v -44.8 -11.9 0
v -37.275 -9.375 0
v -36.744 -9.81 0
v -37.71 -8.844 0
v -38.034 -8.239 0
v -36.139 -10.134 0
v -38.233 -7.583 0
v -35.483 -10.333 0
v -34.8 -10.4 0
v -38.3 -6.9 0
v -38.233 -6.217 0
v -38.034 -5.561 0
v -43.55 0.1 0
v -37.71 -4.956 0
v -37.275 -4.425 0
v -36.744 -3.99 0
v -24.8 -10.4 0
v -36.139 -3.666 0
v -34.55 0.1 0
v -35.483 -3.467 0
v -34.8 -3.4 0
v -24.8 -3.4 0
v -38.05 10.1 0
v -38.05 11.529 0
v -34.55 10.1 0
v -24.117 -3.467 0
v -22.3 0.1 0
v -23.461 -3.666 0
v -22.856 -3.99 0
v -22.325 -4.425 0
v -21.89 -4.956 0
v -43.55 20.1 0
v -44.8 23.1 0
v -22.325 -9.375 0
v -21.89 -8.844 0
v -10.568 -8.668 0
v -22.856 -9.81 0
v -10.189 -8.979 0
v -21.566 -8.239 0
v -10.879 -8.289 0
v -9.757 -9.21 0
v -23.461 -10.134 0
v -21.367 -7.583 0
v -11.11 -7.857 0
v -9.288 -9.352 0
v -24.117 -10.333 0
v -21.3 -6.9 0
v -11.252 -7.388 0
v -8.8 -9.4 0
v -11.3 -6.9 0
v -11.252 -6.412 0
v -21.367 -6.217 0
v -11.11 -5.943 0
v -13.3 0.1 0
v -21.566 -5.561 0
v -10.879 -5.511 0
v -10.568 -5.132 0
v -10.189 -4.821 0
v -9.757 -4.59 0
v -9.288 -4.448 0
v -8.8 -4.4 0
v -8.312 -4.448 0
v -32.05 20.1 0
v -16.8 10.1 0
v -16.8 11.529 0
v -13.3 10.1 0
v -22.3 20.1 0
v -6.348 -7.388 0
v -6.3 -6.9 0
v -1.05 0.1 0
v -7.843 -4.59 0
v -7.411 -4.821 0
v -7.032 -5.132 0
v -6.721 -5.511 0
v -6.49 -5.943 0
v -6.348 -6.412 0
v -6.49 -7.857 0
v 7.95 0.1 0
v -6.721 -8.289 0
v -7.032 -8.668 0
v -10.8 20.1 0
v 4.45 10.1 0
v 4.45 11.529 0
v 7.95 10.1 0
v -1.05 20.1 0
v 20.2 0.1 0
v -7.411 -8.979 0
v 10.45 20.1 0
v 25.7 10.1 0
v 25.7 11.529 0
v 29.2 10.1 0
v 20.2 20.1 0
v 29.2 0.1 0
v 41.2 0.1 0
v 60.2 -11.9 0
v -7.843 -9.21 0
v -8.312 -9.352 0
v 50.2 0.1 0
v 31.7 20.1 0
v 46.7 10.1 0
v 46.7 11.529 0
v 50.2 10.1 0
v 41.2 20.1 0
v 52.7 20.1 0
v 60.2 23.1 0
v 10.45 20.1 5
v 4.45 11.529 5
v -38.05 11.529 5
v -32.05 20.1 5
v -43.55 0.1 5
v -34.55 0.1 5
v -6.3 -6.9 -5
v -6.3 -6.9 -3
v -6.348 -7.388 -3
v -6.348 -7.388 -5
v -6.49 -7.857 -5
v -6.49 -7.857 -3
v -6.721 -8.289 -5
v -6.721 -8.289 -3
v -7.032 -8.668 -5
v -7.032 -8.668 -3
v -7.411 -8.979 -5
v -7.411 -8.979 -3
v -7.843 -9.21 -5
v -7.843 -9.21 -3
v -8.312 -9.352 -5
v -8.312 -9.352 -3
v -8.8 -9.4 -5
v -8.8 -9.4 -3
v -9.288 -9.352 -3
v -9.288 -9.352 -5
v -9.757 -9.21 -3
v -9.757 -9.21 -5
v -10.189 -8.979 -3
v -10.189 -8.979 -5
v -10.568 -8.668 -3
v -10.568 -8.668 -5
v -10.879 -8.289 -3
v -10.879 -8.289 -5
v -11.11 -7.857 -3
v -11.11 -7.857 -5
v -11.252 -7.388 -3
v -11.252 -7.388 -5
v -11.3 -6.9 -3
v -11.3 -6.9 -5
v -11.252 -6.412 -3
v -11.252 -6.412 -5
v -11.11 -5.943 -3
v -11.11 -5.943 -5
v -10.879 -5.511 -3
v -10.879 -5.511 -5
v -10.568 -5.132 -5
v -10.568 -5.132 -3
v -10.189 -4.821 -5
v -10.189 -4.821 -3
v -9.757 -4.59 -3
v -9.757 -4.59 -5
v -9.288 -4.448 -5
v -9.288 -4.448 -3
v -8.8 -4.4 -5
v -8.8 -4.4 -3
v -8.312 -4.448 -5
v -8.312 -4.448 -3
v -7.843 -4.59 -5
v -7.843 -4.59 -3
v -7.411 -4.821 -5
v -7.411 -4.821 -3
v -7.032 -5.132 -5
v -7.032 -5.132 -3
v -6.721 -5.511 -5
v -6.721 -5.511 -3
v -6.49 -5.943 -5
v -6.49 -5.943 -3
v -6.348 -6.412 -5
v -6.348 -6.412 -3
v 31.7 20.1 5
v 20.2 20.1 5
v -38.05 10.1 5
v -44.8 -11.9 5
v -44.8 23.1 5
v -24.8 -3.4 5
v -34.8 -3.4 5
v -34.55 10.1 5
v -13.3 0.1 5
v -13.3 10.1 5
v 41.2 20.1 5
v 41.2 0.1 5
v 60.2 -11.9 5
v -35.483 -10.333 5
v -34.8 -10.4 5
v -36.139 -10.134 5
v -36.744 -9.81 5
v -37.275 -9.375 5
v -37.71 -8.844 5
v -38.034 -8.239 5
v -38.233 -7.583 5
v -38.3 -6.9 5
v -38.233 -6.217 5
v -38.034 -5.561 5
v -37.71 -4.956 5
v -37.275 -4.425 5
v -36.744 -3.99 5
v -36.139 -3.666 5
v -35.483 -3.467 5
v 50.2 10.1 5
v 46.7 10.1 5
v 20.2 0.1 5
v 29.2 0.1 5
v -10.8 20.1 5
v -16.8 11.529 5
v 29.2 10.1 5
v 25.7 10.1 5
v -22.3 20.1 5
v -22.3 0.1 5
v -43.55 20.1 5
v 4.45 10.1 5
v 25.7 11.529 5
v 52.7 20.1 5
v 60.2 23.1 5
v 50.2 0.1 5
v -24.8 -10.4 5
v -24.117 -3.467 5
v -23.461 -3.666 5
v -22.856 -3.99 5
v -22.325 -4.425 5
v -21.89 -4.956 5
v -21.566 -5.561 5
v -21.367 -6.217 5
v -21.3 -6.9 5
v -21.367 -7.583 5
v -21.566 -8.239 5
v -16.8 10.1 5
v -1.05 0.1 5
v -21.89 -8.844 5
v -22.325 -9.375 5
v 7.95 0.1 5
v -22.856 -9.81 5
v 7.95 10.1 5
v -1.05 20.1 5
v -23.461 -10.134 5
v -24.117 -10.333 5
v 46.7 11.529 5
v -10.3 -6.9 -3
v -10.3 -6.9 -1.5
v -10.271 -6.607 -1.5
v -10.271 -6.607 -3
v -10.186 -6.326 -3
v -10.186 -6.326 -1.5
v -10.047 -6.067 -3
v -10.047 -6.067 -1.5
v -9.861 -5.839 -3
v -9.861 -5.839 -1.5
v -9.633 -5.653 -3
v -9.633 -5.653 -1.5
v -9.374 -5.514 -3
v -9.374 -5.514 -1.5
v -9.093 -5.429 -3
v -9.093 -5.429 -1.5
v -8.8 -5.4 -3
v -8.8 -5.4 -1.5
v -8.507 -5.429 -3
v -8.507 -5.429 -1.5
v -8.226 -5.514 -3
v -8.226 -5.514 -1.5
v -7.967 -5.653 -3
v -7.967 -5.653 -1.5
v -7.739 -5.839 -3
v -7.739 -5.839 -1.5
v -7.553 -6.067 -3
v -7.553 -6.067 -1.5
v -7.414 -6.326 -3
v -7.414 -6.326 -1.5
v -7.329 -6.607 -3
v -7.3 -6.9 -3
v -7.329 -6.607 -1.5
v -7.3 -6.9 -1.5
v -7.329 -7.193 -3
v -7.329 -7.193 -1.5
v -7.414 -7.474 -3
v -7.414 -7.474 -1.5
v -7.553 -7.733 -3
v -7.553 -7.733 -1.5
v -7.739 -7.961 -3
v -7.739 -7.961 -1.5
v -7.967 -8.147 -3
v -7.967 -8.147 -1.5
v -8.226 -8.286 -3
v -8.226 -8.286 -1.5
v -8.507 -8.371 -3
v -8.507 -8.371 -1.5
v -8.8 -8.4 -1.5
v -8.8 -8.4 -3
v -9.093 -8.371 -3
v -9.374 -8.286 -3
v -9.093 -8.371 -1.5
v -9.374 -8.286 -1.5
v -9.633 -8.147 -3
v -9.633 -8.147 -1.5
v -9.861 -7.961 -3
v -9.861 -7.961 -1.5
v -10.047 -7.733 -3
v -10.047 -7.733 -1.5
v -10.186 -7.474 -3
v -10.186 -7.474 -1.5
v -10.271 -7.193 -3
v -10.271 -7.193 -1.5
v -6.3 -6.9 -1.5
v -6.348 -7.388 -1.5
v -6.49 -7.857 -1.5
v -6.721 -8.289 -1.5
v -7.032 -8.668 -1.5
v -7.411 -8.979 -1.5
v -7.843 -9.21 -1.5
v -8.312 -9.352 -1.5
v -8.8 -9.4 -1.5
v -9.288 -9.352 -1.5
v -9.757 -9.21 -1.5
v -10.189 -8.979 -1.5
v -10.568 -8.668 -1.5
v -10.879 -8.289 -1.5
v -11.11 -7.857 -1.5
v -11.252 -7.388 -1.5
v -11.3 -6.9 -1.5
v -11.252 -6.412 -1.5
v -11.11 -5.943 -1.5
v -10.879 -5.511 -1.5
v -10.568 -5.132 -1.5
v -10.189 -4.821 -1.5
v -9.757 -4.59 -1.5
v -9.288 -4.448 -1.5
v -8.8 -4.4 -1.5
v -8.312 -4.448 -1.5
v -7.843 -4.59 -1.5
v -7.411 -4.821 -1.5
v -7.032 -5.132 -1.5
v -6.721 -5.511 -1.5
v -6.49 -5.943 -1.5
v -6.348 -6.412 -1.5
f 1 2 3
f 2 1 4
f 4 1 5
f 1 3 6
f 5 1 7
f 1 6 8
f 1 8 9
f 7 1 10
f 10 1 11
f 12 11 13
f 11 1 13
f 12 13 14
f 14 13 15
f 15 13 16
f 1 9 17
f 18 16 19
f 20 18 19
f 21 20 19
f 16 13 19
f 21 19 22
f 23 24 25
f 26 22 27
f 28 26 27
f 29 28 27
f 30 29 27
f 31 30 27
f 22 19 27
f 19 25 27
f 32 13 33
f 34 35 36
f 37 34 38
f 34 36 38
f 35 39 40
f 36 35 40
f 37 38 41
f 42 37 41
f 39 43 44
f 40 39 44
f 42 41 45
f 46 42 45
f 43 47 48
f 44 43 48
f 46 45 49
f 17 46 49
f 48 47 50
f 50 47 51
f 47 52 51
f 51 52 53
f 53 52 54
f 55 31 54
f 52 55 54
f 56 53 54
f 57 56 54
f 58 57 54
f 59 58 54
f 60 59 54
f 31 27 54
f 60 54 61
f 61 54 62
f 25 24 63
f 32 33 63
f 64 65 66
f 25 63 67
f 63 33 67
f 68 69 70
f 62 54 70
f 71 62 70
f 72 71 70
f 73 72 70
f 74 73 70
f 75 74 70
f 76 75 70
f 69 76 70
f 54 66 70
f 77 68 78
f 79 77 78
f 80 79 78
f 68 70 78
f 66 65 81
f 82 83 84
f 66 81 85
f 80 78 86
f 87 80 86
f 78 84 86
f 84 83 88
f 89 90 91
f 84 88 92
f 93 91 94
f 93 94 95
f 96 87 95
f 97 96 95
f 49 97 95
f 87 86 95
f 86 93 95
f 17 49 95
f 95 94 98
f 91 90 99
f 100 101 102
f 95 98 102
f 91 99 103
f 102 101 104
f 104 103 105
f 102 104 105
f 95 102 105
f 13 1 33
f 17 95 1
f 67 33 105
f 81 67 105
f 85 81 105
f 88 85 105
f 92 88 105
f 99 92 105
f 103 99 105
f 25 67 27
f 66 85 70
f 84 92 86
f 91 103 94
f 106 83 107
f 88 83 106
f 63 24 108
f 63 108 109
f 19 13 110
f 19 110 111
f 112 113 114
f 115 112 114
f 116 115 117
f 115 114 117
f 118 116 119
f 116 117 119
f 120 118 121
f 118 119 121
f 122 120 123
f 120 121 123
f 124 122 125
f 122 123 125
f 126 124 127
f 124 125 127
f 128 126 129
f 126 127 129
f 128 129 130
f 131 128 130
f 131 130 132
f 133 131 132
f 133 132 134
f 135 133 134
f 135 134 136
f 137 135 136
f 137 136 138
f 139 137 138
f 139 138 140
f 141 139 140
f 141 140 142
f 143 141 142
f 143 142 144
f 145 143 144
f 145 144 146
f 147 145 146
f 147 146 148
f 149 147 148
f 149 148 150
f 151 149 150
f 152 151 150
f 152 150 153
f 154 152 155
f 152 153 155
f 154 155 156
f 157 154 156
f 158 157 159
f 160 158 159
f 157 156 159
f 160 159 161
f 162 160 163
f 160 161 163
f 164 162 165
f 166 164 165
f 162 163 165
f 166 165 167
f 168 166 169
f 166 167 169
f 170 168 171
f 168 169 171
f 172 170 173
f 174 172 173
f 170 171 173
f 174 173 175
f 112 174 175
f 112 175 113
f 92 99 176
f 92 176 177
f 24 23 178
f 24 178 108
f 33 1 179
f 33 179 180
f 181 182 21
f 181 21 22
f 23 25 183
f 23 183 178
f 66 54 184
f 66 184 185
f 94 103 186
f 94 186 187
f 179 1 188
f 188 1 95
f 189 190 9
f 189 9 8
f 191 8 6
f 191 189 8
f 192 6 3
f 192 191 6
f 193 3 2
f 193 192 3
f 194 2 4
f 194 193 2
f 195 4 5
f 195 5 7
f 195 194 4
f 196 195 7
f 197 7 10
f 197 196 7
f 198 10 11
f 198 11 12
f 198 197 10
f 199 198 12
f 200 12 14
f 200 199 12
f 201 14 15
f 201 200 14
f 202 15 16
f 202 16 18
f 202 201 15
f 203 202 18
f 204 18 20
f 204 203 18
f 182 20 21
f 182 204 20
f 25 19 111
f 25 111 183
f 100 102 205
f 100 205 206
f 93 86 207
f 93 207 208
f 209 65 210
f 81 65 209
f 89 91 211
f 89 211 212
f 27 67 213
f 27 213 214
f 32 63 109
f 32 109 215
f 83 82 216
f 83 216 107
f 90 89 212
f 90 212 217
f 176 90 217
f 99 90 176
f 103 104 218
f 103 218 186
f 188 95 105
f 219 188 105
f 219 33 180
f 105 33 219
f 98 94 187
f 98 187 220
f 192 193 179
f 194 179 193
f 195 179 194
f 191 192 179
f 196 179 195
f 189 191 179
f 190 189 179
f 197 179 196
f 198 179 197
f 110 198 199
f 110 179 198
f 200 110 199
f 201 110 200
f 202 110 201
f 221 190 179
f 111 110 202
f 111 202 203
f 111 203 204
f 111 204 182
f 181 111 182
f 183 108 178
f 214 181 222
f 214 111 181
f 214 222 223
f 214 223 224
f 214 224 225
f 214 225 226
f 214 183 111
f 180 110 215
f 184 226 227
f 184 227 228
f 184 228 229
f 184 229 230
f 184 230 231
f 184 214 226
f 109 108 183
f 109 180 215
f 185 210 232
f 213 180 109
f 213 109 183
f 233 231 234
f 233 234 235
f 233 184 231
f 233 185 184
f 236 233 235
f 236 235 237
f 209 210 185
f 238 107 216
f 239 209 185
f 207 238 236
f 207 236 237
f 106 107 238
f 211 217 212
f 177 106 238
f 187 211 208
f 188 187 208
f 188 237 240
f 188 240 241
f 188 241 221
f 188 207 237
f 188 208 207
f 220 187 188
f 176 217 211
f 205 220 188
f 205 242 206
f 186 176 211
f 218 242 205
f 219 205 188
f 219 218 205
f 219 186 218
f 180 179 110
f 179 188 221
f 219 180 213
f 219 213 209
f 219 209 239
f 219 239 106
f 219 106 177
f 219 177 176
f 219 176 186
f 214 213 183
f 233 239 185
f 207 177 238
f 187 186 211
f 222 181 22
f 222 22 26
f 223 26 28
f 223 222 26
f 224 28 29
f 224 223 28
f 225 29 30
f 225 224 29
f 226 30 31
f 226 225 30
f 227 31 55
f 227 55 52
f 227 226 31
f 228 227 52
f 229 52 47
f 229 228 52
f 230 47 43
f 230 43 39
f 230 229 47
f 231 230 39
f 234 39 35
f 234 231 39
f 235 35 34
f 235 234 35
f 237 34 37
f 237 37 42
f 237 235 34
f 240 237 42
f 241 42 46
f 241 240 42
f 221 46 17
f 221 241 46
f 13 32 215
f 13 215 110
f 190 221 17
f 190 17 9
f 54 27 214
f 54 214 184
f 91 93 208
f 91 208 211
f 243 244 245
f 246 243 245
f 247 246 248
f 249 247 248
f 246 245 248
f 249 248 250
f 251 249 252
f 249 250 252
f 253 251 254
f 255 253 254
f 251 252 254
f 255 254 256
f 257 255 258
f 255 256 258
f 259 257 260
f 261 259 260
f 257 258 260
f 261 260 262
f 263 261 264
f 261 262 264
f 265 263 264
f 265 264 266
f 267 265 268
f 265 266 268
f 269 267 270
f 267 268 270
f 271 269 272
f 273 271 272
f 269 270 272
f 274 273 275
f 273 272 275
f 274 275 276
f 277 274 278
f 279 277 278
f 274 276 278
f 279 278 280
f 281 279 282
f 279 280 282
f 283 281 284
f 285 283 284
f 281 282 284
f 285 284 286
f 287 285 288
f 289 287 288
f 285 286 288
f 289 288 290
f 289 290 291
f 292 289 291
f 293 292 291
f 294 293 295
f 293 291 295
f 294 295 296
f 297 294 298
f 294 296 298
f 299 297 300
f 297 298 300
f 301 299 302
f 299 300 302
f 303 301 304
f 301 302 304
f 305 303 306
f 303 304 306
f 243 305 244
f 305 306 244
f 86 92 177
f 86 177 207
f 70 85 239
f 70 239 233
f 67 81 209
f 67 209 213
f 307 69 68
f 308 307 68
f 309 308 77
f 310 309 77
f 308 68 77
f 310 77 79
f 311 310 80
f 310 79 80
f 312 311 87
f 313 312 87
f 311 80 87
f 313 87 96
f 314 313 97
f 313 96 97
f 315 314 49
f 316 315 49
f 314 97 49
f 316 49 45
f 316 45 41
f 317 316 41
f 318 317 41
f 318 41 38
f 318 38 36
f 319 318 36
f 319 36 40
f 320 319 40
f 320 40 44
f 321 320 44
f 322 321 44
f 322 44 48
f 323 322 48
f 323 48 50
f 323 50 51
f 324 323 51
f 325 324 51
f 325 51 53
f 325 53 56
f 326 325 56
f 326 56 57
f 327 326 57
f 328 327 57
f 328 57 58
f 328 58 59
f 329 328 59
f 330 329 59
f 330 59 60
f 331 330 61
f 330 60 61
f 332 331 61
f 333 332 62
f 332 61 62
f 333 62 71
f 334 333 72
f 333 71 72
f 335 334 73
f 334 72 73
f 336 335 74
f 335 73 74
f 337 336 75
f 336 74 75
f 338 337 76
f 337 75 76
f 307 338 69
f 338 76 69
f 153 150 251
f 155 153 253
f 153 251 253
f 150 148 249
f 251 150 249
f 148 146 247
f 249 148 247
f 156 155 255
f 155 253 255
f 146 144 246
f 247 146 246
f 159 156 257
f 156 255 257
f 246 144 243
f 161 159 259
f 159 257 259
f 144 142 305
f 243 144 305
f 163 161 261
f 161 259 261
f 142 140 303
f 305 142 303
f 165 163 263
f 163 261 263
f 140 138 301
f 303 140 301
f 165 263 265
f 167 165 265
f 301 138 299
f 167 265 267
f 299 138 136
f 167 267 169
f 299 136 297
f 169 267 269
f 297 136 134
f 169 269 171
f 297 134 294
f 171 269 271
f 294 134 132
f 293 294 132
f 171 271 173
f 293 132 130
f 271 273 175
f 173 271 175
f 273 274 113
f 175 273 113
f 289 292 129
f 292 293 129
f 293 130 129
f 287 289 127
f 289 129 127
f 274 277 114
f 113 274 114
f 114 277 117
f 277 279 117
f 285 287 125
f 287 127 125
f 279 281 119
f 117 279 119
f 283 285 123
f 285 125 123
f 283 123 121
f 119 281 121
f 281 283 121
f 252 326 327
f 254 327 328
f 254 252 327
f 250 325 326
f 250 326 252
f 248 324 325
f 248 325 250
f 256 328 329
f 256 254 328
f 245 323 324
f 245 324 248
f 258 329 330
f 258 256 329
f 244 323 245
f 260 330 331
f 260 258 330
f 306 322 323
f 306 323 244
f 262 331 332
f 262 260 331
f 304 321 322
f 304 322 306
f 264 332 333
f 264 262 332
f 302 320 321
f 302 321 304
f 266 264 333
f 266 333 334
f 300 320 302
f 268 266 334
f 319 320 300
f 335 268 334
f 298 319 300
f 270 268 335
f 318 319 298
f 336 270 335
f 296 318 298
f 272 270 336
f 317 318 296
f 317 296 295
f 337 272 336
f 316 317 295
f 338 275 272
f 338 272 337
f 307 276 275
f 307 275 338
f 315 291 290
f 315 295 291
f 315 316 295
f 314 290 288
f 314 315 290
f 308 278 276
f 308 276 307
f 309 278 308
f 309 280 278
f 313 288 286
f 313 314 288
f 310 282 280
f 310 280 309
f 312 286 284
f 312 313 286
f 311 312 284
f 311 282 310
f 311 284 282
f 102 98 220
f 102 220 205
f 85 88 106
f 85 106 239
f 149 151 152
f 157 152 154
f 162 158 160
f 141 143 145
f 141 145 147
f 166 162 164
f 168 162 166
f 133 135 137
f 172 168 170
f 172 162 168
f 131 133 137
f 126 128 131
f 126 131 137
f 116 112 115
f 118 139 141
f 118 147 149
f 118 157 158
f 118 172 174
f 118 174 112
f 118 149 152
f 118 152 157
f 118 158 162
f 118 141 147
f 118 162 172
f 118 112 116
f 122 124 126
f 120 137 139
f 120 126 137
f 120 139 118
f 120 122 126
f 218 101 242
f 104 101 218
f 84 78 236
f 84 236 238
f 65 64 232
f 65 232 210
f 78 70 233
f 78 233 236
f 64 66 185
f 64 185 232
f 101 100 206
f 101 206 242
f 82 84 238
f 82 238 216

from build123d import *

# Parameters (mm, degrees)
SKETCH1_W           = 105
SKETCH1_H           = 35
BOSS_EXTRUDE1_DEPTH = 5
CUT_EXTRUDE1_DEPTH  = 5
SKETCH3_R           = 2.5
BOSS_EXTRUDE2_DEPTH = 5
CUT_EXTRUDE3_START  = -3.5
SKETCH4_R           = 2.5
SKETCH4_R_2         = 1.5
CUT_EXTRUDE3_DEPTH  = 1.5
CUT_EXTRUDE4_DEPTH  = 5
SKETCH6_W           = 1
SKETCH6_H           = 5.473396058
SKETCH6_H_2         = 2.850644757
SKETCH6_H_3         = 4.642061194
SKETCH6_H_4         = 3.194118723
CUT_EXTRUDE5_DEPTH  = 10


with BuildPart() as part:
    # Sketch1 → Boss-Extrude1 (new body)
    with BuildSketch(Plane.XY):
        with Locations((7.7, 5.6)):
            Rectangle(SKETCH1_W, SKETCH1_H)
    extrude(amount=BOSS_EXTRUDE1_DEPTH)

    # Sketch2 → Cut-Extrude1 (cut)
    with BuildSketch(Plane.XY.offset(5)):
        with BuildLine():
            Line((-34.8, -3.4), (-24.8, -3.4))
            ThreePointArc((-24.8, -3.4), (-21.3, -6.9), (-24.8, -10.4))
            Line((-24.8, -10.4), (-34.8, -10.4))
            ThreePointArc((-34.8, -10.4), (-38.3, -6.9), (-34.8, -3.4))
        make_face()
    extrude(amount=-CUT_EXTRUDE1_DEPTH, mode=Mode.SUBTRACT)

    # Sketch3 → Boss-Extrude2 (add)
    with BuildSketch(Plane(origin=(0, 0, 0), x_dir=(-1, 0, 0), z_dir=(0, 0, -1))):
        with Locations(Location((8.8, -6.9, 0), (0, 0, 180))):
            Circle(SKETCH3_R)
    extrude(amount=BOSS_EXTRUDE2_DEPTH)

    # Sketch4 → Cut-Extrude3 (cut)
    with BuildSketch(Plane(origin=(0, 0, -5), x_dir=(-1, 0, 0), z_dir=(0, 0, -1)).offset(CUT_EXTRUDE3_START)):
        with Locations(Location((8.8, -6.9, 0), (0, 0, 180))):
            Circle(SKETCH4_R)
        with Locations((8.8, -6.9)):
            Circle(SKETCH4_R_2, mode=Mode.SUBTRACT)
    extrude(amount=CUT_EXTRUDE3_DEPTH, mode=Mode.SUBTRACT)

    # Sketch5 → Cut-Extrude4 (cut)
    with BuildSketch(Plane(origin=(0, 0, 0), x_dir=(-1, 0, 0), z_dir=(0, 0, -1))):
        Polygon((-41.2, 0.1), (-50.2, 0.1), (-50.2, 10.1), (-45.7, 10.1), (-52.7, 20.1), (-41.2, 20.1), align=None)
        Polygon((-20.2, 0.1), (-29.2, 0.1), (-29.2, 10.1), (-24.7, 10.1), (-31.7, 20.1), (-20.2, 20.1), align=None)
        Polygon((1.05, 0.1), (-7.95, 0.1), (-7.95, 10.1), (-3.45, 10.1), (-10.45, 20.1), (1.05, 20.1), align=None)
        Polygon((22.3, 0.1), (13.3, 0.1), (13.3, 10.1), (17.8, 10.1), (10.8, 20.1), (22.3, 20.1), align=None)
        Polygon((43.55, 0.1), (34.55, 0.1), (34.55, 10.1), (39.05, 10.1), (32.05, 20.1), (43.55, 20.1), align=None)
    extrude(amount=-CUT_EXTRUDE4_DEPTH, mode=Mode.SUBTRACT)

    # Sketch6 → Cut-Extrude5 (cut)
    with BuildSketch(Plane(origin=(0, 0, 0), x_dir=(-1, 0, 0), z_dir=(0, 0, -1))):
        with Locations((-46.2, 10.54511412)):
            Rectangle(SKETCH6_W, SKETCH6_H)
        with Locations((-25.2, 10.54511412)):
            Rectangle(SKETCH6_W, SKETCH6_H)
        with Locations((-3.95, 10.654861904)):
            Rectangle(SKETCH6_W, SKETCH6_H_2)
        with Locations((17.3, 10.960781552)):
            Rectangle(SKETCH6_W, SKETCH6_H_3)
        with Locations((38.55, 10.826598887)):
            Rectangle(SKETCH6_W, SKETCH6_H_4)
    extrude(amount=-CUT_EXTRUDE5_DEPTH, mode=Mode.SUBTRACT)


solid = part.part
